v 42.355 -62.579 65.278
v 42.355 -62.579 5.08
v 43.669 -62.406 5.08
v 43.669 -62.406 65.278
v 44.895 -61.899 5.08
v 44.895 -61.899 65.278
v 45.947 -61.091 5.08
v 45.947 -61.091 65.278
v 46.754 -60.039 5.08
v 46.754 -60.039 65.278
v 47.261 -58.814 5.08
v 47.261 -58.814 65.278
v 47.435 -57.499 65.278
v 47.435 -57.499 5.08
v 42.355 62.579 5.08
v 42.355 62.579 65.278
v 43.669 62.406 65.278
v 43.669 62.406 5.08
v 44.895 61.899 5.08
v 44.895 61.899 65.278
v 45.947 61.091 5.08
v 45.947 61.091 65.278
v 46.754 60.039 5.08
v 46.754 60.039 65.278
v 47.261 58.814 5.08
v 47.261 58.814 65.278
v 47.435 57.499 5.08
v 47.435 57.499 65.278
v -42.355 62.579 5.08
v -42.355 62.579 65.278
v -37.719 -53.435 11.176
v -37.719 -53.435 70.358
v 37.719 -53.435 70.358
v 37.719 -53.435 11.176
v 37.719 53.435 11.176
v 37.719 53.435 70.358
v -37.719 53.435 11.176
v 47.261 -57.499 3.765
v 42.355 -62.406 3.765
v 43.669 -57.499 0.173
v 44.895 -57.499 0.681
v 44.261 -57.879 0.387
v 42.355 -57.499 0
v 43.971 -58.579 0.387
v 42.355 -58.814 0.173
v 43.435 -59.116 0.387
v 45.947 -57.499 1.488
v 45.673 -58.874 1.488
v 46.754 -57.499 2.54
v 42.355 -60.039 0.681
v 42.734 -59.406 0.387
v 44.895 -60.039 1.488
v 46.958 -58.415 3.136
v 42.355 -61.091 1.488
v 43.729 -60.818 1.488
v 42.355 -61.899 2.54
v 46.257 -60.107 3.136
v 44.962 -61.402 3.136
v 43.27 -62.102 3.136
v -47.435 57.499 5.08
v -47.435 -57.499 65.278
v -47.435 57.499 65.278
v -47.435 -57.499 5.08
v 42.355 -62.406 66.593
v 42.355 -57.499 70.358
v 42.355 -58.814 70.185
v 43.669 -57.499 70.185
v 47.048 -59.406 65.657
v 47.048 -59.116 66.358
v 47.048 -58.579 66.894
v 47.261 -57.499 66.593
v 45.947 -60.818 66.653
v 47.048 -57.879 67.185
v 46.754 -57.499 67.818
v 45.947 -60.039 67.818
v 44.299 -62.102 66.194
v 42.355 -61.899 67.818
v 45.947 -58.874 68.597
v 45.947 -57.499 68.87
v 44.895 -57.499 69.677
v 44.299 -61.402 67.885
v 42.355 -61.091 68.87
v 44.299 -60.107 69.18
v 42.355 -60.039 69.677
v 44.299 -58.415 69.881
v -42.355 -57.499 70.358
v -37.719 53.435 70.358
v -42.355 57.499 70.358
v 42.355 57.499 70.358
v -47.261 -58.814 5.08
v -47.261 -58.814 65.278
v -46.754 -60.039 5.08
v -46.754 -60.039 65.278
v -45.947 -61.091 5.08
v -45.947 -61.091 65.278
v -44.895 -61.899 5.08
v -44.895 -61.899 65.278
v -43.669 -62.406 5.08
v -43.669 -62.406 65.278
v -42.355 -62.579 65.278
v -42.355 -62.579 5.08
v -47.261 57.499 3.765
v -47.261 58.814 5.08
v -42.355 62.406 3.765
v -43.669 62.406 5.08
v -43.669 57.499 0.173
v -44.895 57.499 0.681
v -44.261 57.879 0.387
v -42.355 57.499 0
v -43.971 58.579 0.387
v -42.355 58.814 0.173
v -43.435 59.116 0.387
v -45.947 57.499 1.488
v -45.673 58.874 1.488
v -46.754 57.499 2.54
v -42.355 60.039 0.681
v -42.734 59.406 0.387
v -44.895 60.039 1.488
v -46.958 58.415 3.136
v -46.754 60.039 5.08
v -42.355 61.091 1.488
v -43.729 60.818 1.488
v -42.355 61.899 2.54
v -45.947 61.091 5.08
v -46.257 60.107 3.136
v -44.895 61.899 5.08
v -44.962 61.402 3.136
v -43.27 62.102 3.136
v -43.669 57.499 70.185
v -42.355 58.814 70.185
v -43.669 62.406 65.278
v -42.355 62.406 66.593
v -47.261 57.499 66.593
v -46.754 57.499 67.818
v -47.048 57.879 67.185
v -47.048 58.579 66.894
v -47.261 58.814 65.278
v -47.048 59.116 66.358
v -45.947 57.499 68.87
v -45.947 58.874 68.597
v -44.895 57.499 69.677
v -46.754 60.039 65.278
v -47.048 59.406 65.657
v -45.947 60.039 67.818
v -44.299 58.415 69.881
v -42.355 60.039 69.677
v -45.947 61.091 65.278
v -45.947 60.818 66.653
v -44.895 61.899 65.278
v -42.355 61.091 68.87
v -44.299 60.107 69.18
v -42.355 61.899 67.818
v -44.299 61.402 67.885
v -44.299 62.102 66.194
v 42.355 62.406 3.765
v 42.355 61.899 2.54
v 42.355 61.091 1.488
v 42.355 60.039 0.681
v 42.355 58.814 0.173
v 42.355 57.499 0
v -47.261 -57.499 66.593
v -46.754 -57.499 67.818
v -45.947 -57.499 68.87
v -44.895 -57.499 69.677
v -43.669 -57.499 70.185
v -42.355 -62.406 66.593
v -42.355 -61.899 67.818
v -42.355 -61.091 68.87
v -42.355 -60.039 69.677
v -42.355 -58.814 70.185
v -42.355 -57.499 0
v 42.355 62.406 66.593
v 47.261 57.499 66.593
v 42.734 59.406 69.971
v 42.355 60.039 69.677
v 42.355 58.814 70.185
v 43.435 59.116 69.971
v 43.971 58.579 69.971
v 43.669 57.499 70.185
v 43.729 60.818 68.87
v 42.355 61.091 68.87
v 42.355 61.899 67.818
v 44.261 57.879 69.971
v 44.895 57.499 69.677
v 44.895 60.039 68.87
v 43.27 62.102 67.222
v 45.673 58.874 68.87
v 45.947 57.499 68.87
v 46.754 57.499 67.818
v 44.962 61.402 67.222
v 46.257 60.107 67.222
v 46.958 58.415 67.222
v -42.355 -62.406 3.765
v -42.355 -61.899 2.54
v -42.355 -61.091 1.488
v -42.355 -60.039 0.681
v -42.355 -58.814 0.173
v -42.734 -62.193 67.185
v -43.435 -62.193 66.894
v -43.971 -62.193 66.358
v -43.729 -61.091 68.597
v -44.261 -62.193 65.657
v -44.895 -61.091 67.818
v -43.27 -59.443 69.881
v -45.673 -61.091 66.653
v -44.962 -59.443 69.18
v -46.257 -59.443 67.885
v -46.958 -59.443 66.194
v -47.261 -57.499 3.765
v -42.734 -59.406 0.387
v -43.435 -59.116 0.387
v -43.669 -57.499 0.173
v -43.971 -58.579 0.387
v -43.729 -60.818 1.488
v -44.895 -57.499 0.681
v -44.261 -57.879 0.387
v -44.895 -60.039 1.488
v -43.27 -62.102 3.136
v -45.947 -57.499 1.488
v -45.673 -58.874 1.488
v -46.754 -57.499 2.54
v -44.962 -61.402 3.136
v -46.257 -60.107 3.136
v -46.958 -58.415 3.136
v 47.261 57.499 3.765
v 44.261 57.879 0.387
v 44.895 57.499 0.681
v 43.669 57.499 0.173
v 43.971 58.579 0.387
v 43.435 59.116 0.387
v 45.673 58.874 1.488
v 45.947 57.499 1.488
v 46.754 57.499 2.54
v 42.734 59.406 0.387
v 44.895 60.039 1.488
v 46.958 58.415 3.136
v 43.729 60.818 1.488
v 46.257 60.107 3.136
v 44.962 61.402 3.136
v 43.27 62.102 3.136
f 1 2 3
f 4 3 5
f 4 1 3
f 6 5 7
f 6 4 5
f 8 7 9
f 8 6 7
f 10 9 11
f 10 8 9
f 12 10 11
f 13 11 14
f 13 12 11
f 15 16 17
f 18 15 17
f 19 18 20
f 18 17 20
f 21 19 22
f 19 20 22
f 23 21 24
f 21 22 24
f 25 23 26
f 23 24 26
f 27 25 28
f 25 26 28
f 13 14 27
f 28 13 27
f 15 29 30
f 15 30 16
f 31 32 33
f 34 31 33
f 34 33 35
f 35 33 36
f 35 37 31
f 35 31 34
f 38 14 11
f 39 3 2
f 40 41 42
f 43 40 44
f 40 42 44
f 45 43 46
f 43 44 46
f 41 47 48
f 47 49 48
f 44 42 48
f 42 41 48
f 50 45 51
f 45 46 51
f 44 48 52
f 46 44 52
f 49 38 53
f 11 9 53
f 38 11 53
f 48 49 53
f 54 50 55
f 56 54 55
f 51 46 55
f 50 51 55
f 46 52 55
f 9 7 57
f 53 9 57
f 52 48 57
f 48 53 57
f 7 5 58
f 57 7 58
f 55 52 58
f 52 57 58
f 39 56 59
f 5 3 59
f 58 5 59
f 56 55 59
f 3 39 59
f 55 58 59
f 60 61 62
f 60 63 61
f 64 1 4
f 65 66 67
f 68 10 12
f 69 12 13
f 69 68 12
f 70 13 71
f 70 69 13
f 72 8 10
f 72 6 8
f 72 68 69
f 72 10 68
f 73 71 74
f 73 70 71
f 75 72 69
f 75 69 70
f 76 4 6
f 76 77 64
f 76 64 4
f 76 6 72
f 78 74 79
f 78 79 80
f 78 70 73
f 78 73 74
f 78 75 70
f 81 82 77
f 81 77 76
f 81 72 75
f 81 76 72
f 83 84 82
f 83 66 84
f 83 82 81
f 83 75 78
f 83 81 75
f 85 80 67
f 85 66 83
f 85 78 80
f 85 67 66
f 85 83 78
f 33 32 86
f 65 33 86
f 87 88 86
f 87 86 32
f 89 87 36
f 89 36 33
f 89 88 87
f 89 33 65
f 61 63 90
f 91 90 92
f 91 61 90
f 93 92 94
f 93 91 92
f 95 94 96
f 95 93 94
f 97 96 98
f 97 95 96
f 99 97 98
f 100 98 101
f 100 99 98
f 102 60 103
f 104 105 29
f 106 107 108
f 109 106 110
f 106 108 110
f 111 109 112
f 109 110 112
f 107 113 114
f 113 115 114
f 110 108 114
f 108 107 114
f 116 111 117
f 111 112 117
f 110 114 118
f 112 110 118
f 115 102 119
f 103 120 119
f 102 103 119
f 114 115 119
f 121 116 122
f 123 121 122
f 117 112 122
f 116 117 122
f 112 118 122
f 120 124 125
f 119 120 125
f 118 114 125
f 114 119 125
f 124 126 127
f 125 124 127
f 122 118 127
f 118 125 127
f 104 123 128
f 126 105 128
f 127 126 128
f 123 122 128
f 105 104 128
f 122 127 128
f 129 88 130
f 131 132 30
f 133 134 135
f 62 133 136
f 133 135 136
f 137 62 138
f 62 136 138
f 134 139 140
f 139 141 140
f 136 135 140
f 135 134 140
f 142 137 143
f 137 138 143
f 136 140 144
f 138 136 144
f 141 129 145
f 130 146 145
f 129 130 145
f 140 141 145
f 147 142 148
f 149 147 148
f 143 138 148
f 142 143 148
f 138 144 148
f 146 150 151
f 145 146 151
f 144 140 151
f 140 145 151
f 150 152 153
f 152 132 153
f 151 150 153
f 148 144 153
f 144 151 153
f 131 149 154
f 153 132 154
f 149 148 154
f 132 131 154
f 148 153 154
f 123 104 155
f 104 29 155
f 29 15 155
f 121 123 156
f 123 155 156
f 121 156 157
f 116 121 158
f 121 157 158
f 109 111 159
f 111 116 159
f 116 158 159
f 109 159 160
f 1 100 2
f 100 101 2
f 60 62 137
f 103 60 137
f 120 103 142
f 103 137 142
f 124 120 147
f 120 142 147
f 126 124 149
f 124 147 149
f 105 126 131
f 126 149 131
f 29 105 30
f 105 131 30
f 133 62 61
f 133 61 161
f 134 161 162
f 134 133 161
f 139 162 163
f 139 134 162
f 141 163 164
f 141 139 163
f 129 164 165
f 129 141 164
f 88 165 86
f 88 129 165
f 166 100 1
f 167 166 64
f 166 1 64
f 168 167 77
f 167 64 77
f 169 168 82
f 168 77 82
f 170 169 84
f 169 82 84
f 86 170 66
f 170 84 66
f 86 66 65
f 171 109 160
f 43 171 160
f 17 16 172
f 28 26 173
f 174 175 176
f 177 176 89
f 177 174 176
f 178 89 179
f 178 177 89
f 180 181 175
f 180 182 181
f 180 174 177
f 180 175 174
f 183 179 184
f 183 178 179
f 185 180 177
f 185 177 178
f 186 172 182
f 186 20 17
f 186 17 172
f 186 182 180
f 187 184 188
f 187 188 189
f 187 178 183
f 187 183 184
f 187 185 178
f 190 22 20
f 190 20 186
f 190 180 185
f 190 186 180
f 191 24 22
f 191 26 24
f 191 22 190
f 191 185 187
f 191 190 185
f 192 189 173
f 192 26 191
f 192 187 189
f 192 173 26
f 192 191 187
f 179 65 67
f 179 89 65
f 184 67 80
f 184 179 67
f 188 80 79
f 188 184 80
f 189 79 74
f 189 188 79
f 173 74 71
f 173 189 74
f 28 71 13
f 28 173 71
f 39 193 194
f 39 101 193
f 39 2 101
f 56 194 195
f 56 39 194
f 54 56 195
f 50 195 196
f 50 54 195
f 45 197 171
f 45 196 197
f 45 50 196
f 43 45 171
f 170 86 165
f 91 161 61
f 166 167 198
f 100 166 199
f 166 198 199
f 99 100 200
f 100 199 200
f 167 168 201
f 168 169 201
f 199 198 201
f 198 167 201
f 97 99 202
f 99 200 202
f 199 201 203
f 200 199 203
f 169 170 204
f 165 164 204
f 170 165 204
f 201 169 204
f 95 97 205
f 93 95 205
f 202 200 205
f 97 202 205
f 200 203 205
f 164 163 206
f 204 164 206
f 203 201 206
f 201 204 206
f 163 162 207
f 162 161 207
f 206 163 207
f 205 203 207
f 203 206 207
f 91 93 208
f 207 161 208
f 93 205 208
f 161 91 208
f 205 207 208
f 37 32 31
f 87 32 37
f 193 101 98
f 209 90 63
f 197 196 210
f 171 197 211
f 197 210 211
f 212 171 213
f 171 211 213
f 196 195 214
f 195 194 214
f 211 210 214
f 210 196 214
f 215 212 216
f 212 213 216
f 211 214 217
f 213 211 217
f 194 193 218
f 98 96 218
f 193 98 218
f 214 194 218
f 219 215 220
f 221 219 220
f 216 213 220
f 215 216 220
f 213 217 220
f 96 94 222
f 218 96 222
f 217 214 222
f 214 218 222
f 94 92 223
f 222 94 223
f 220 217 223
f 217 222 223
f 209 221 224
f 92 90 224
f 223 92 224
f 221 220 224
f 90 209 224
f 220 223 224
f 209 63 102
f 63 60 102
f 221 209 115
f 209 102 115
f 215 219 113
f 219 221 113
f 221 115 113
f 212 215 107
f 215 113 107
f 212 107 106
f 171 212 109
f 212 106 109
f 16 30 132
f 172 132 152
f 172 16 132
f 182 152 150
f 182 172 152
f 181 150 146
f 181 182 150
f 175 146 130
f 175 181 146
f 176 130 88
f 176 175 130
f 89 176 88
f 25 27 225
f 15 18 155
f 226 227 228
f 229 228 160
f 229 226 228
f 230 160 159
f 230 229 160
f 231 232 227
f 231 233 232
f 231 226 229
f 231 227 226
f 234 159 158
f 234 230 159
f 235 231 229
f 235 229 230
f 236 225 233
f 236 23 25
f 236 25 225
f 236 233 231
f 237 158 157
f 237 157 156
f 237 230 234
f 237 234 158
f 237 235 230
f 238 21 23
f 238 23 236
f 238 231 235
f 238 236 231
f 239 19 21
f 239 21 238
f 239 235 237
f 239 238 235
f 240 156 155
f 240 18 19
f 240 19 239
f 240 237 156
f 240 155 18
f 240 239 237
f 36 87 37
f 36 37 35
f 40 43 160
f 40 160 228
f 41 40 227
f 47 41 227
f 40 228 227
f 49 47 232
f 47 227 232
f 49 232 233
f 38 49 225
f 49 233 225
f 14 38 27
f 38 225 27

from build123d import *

# Parameters (mm, degrees)
F0_W     = 94.869002
F0_H     = 125.158504
F1_DEPTH = 70.358
F2_W     = 75.438
F2_H     = 106.870502
F3_DEPTH = 59.182
F4_R     = 5.08


with BuildPart() as f1:
    # F0 (on Top) → F1 (new body)
    with BuildSketch(Plane.XY):
        Rectangle(F0_W, F0_H)
    extrude(amount=F1_DEPTH)

    # F2 (on face) → F3 (cut)
    with BuildSketch(Plane.XY.offset(70.358)):
        Rectangle(F2_W, F2_H)
    extrude(amount=-F3_DEPTH, mode=Mode.SUBTRACT)

    # F4
    f4_edges = [f1.edges().sort_by_distance(p)[0] for p in [
        (47.434501, 62.579252, 35.179),
        (0, 62.579252, 70.358),
        (-47.434501, 0, 70.358),
        (0, -62.579252, 70.358),
        (47.434501, -62.579252, 35.179),
        (47.434501, 0, 0),
        (47.434501, 0, 70.358),
        (-47.434501, -62.579252, 35.179),
        (0, -62.579252, 0),
        (-47.434501, 62.579252, 35.179),
        (-47.434501, 0, 0),
        (0, 62.579252, 0),
    ]]
    fillet(f4_edges, radius=F4_R)


solid = f1.part
